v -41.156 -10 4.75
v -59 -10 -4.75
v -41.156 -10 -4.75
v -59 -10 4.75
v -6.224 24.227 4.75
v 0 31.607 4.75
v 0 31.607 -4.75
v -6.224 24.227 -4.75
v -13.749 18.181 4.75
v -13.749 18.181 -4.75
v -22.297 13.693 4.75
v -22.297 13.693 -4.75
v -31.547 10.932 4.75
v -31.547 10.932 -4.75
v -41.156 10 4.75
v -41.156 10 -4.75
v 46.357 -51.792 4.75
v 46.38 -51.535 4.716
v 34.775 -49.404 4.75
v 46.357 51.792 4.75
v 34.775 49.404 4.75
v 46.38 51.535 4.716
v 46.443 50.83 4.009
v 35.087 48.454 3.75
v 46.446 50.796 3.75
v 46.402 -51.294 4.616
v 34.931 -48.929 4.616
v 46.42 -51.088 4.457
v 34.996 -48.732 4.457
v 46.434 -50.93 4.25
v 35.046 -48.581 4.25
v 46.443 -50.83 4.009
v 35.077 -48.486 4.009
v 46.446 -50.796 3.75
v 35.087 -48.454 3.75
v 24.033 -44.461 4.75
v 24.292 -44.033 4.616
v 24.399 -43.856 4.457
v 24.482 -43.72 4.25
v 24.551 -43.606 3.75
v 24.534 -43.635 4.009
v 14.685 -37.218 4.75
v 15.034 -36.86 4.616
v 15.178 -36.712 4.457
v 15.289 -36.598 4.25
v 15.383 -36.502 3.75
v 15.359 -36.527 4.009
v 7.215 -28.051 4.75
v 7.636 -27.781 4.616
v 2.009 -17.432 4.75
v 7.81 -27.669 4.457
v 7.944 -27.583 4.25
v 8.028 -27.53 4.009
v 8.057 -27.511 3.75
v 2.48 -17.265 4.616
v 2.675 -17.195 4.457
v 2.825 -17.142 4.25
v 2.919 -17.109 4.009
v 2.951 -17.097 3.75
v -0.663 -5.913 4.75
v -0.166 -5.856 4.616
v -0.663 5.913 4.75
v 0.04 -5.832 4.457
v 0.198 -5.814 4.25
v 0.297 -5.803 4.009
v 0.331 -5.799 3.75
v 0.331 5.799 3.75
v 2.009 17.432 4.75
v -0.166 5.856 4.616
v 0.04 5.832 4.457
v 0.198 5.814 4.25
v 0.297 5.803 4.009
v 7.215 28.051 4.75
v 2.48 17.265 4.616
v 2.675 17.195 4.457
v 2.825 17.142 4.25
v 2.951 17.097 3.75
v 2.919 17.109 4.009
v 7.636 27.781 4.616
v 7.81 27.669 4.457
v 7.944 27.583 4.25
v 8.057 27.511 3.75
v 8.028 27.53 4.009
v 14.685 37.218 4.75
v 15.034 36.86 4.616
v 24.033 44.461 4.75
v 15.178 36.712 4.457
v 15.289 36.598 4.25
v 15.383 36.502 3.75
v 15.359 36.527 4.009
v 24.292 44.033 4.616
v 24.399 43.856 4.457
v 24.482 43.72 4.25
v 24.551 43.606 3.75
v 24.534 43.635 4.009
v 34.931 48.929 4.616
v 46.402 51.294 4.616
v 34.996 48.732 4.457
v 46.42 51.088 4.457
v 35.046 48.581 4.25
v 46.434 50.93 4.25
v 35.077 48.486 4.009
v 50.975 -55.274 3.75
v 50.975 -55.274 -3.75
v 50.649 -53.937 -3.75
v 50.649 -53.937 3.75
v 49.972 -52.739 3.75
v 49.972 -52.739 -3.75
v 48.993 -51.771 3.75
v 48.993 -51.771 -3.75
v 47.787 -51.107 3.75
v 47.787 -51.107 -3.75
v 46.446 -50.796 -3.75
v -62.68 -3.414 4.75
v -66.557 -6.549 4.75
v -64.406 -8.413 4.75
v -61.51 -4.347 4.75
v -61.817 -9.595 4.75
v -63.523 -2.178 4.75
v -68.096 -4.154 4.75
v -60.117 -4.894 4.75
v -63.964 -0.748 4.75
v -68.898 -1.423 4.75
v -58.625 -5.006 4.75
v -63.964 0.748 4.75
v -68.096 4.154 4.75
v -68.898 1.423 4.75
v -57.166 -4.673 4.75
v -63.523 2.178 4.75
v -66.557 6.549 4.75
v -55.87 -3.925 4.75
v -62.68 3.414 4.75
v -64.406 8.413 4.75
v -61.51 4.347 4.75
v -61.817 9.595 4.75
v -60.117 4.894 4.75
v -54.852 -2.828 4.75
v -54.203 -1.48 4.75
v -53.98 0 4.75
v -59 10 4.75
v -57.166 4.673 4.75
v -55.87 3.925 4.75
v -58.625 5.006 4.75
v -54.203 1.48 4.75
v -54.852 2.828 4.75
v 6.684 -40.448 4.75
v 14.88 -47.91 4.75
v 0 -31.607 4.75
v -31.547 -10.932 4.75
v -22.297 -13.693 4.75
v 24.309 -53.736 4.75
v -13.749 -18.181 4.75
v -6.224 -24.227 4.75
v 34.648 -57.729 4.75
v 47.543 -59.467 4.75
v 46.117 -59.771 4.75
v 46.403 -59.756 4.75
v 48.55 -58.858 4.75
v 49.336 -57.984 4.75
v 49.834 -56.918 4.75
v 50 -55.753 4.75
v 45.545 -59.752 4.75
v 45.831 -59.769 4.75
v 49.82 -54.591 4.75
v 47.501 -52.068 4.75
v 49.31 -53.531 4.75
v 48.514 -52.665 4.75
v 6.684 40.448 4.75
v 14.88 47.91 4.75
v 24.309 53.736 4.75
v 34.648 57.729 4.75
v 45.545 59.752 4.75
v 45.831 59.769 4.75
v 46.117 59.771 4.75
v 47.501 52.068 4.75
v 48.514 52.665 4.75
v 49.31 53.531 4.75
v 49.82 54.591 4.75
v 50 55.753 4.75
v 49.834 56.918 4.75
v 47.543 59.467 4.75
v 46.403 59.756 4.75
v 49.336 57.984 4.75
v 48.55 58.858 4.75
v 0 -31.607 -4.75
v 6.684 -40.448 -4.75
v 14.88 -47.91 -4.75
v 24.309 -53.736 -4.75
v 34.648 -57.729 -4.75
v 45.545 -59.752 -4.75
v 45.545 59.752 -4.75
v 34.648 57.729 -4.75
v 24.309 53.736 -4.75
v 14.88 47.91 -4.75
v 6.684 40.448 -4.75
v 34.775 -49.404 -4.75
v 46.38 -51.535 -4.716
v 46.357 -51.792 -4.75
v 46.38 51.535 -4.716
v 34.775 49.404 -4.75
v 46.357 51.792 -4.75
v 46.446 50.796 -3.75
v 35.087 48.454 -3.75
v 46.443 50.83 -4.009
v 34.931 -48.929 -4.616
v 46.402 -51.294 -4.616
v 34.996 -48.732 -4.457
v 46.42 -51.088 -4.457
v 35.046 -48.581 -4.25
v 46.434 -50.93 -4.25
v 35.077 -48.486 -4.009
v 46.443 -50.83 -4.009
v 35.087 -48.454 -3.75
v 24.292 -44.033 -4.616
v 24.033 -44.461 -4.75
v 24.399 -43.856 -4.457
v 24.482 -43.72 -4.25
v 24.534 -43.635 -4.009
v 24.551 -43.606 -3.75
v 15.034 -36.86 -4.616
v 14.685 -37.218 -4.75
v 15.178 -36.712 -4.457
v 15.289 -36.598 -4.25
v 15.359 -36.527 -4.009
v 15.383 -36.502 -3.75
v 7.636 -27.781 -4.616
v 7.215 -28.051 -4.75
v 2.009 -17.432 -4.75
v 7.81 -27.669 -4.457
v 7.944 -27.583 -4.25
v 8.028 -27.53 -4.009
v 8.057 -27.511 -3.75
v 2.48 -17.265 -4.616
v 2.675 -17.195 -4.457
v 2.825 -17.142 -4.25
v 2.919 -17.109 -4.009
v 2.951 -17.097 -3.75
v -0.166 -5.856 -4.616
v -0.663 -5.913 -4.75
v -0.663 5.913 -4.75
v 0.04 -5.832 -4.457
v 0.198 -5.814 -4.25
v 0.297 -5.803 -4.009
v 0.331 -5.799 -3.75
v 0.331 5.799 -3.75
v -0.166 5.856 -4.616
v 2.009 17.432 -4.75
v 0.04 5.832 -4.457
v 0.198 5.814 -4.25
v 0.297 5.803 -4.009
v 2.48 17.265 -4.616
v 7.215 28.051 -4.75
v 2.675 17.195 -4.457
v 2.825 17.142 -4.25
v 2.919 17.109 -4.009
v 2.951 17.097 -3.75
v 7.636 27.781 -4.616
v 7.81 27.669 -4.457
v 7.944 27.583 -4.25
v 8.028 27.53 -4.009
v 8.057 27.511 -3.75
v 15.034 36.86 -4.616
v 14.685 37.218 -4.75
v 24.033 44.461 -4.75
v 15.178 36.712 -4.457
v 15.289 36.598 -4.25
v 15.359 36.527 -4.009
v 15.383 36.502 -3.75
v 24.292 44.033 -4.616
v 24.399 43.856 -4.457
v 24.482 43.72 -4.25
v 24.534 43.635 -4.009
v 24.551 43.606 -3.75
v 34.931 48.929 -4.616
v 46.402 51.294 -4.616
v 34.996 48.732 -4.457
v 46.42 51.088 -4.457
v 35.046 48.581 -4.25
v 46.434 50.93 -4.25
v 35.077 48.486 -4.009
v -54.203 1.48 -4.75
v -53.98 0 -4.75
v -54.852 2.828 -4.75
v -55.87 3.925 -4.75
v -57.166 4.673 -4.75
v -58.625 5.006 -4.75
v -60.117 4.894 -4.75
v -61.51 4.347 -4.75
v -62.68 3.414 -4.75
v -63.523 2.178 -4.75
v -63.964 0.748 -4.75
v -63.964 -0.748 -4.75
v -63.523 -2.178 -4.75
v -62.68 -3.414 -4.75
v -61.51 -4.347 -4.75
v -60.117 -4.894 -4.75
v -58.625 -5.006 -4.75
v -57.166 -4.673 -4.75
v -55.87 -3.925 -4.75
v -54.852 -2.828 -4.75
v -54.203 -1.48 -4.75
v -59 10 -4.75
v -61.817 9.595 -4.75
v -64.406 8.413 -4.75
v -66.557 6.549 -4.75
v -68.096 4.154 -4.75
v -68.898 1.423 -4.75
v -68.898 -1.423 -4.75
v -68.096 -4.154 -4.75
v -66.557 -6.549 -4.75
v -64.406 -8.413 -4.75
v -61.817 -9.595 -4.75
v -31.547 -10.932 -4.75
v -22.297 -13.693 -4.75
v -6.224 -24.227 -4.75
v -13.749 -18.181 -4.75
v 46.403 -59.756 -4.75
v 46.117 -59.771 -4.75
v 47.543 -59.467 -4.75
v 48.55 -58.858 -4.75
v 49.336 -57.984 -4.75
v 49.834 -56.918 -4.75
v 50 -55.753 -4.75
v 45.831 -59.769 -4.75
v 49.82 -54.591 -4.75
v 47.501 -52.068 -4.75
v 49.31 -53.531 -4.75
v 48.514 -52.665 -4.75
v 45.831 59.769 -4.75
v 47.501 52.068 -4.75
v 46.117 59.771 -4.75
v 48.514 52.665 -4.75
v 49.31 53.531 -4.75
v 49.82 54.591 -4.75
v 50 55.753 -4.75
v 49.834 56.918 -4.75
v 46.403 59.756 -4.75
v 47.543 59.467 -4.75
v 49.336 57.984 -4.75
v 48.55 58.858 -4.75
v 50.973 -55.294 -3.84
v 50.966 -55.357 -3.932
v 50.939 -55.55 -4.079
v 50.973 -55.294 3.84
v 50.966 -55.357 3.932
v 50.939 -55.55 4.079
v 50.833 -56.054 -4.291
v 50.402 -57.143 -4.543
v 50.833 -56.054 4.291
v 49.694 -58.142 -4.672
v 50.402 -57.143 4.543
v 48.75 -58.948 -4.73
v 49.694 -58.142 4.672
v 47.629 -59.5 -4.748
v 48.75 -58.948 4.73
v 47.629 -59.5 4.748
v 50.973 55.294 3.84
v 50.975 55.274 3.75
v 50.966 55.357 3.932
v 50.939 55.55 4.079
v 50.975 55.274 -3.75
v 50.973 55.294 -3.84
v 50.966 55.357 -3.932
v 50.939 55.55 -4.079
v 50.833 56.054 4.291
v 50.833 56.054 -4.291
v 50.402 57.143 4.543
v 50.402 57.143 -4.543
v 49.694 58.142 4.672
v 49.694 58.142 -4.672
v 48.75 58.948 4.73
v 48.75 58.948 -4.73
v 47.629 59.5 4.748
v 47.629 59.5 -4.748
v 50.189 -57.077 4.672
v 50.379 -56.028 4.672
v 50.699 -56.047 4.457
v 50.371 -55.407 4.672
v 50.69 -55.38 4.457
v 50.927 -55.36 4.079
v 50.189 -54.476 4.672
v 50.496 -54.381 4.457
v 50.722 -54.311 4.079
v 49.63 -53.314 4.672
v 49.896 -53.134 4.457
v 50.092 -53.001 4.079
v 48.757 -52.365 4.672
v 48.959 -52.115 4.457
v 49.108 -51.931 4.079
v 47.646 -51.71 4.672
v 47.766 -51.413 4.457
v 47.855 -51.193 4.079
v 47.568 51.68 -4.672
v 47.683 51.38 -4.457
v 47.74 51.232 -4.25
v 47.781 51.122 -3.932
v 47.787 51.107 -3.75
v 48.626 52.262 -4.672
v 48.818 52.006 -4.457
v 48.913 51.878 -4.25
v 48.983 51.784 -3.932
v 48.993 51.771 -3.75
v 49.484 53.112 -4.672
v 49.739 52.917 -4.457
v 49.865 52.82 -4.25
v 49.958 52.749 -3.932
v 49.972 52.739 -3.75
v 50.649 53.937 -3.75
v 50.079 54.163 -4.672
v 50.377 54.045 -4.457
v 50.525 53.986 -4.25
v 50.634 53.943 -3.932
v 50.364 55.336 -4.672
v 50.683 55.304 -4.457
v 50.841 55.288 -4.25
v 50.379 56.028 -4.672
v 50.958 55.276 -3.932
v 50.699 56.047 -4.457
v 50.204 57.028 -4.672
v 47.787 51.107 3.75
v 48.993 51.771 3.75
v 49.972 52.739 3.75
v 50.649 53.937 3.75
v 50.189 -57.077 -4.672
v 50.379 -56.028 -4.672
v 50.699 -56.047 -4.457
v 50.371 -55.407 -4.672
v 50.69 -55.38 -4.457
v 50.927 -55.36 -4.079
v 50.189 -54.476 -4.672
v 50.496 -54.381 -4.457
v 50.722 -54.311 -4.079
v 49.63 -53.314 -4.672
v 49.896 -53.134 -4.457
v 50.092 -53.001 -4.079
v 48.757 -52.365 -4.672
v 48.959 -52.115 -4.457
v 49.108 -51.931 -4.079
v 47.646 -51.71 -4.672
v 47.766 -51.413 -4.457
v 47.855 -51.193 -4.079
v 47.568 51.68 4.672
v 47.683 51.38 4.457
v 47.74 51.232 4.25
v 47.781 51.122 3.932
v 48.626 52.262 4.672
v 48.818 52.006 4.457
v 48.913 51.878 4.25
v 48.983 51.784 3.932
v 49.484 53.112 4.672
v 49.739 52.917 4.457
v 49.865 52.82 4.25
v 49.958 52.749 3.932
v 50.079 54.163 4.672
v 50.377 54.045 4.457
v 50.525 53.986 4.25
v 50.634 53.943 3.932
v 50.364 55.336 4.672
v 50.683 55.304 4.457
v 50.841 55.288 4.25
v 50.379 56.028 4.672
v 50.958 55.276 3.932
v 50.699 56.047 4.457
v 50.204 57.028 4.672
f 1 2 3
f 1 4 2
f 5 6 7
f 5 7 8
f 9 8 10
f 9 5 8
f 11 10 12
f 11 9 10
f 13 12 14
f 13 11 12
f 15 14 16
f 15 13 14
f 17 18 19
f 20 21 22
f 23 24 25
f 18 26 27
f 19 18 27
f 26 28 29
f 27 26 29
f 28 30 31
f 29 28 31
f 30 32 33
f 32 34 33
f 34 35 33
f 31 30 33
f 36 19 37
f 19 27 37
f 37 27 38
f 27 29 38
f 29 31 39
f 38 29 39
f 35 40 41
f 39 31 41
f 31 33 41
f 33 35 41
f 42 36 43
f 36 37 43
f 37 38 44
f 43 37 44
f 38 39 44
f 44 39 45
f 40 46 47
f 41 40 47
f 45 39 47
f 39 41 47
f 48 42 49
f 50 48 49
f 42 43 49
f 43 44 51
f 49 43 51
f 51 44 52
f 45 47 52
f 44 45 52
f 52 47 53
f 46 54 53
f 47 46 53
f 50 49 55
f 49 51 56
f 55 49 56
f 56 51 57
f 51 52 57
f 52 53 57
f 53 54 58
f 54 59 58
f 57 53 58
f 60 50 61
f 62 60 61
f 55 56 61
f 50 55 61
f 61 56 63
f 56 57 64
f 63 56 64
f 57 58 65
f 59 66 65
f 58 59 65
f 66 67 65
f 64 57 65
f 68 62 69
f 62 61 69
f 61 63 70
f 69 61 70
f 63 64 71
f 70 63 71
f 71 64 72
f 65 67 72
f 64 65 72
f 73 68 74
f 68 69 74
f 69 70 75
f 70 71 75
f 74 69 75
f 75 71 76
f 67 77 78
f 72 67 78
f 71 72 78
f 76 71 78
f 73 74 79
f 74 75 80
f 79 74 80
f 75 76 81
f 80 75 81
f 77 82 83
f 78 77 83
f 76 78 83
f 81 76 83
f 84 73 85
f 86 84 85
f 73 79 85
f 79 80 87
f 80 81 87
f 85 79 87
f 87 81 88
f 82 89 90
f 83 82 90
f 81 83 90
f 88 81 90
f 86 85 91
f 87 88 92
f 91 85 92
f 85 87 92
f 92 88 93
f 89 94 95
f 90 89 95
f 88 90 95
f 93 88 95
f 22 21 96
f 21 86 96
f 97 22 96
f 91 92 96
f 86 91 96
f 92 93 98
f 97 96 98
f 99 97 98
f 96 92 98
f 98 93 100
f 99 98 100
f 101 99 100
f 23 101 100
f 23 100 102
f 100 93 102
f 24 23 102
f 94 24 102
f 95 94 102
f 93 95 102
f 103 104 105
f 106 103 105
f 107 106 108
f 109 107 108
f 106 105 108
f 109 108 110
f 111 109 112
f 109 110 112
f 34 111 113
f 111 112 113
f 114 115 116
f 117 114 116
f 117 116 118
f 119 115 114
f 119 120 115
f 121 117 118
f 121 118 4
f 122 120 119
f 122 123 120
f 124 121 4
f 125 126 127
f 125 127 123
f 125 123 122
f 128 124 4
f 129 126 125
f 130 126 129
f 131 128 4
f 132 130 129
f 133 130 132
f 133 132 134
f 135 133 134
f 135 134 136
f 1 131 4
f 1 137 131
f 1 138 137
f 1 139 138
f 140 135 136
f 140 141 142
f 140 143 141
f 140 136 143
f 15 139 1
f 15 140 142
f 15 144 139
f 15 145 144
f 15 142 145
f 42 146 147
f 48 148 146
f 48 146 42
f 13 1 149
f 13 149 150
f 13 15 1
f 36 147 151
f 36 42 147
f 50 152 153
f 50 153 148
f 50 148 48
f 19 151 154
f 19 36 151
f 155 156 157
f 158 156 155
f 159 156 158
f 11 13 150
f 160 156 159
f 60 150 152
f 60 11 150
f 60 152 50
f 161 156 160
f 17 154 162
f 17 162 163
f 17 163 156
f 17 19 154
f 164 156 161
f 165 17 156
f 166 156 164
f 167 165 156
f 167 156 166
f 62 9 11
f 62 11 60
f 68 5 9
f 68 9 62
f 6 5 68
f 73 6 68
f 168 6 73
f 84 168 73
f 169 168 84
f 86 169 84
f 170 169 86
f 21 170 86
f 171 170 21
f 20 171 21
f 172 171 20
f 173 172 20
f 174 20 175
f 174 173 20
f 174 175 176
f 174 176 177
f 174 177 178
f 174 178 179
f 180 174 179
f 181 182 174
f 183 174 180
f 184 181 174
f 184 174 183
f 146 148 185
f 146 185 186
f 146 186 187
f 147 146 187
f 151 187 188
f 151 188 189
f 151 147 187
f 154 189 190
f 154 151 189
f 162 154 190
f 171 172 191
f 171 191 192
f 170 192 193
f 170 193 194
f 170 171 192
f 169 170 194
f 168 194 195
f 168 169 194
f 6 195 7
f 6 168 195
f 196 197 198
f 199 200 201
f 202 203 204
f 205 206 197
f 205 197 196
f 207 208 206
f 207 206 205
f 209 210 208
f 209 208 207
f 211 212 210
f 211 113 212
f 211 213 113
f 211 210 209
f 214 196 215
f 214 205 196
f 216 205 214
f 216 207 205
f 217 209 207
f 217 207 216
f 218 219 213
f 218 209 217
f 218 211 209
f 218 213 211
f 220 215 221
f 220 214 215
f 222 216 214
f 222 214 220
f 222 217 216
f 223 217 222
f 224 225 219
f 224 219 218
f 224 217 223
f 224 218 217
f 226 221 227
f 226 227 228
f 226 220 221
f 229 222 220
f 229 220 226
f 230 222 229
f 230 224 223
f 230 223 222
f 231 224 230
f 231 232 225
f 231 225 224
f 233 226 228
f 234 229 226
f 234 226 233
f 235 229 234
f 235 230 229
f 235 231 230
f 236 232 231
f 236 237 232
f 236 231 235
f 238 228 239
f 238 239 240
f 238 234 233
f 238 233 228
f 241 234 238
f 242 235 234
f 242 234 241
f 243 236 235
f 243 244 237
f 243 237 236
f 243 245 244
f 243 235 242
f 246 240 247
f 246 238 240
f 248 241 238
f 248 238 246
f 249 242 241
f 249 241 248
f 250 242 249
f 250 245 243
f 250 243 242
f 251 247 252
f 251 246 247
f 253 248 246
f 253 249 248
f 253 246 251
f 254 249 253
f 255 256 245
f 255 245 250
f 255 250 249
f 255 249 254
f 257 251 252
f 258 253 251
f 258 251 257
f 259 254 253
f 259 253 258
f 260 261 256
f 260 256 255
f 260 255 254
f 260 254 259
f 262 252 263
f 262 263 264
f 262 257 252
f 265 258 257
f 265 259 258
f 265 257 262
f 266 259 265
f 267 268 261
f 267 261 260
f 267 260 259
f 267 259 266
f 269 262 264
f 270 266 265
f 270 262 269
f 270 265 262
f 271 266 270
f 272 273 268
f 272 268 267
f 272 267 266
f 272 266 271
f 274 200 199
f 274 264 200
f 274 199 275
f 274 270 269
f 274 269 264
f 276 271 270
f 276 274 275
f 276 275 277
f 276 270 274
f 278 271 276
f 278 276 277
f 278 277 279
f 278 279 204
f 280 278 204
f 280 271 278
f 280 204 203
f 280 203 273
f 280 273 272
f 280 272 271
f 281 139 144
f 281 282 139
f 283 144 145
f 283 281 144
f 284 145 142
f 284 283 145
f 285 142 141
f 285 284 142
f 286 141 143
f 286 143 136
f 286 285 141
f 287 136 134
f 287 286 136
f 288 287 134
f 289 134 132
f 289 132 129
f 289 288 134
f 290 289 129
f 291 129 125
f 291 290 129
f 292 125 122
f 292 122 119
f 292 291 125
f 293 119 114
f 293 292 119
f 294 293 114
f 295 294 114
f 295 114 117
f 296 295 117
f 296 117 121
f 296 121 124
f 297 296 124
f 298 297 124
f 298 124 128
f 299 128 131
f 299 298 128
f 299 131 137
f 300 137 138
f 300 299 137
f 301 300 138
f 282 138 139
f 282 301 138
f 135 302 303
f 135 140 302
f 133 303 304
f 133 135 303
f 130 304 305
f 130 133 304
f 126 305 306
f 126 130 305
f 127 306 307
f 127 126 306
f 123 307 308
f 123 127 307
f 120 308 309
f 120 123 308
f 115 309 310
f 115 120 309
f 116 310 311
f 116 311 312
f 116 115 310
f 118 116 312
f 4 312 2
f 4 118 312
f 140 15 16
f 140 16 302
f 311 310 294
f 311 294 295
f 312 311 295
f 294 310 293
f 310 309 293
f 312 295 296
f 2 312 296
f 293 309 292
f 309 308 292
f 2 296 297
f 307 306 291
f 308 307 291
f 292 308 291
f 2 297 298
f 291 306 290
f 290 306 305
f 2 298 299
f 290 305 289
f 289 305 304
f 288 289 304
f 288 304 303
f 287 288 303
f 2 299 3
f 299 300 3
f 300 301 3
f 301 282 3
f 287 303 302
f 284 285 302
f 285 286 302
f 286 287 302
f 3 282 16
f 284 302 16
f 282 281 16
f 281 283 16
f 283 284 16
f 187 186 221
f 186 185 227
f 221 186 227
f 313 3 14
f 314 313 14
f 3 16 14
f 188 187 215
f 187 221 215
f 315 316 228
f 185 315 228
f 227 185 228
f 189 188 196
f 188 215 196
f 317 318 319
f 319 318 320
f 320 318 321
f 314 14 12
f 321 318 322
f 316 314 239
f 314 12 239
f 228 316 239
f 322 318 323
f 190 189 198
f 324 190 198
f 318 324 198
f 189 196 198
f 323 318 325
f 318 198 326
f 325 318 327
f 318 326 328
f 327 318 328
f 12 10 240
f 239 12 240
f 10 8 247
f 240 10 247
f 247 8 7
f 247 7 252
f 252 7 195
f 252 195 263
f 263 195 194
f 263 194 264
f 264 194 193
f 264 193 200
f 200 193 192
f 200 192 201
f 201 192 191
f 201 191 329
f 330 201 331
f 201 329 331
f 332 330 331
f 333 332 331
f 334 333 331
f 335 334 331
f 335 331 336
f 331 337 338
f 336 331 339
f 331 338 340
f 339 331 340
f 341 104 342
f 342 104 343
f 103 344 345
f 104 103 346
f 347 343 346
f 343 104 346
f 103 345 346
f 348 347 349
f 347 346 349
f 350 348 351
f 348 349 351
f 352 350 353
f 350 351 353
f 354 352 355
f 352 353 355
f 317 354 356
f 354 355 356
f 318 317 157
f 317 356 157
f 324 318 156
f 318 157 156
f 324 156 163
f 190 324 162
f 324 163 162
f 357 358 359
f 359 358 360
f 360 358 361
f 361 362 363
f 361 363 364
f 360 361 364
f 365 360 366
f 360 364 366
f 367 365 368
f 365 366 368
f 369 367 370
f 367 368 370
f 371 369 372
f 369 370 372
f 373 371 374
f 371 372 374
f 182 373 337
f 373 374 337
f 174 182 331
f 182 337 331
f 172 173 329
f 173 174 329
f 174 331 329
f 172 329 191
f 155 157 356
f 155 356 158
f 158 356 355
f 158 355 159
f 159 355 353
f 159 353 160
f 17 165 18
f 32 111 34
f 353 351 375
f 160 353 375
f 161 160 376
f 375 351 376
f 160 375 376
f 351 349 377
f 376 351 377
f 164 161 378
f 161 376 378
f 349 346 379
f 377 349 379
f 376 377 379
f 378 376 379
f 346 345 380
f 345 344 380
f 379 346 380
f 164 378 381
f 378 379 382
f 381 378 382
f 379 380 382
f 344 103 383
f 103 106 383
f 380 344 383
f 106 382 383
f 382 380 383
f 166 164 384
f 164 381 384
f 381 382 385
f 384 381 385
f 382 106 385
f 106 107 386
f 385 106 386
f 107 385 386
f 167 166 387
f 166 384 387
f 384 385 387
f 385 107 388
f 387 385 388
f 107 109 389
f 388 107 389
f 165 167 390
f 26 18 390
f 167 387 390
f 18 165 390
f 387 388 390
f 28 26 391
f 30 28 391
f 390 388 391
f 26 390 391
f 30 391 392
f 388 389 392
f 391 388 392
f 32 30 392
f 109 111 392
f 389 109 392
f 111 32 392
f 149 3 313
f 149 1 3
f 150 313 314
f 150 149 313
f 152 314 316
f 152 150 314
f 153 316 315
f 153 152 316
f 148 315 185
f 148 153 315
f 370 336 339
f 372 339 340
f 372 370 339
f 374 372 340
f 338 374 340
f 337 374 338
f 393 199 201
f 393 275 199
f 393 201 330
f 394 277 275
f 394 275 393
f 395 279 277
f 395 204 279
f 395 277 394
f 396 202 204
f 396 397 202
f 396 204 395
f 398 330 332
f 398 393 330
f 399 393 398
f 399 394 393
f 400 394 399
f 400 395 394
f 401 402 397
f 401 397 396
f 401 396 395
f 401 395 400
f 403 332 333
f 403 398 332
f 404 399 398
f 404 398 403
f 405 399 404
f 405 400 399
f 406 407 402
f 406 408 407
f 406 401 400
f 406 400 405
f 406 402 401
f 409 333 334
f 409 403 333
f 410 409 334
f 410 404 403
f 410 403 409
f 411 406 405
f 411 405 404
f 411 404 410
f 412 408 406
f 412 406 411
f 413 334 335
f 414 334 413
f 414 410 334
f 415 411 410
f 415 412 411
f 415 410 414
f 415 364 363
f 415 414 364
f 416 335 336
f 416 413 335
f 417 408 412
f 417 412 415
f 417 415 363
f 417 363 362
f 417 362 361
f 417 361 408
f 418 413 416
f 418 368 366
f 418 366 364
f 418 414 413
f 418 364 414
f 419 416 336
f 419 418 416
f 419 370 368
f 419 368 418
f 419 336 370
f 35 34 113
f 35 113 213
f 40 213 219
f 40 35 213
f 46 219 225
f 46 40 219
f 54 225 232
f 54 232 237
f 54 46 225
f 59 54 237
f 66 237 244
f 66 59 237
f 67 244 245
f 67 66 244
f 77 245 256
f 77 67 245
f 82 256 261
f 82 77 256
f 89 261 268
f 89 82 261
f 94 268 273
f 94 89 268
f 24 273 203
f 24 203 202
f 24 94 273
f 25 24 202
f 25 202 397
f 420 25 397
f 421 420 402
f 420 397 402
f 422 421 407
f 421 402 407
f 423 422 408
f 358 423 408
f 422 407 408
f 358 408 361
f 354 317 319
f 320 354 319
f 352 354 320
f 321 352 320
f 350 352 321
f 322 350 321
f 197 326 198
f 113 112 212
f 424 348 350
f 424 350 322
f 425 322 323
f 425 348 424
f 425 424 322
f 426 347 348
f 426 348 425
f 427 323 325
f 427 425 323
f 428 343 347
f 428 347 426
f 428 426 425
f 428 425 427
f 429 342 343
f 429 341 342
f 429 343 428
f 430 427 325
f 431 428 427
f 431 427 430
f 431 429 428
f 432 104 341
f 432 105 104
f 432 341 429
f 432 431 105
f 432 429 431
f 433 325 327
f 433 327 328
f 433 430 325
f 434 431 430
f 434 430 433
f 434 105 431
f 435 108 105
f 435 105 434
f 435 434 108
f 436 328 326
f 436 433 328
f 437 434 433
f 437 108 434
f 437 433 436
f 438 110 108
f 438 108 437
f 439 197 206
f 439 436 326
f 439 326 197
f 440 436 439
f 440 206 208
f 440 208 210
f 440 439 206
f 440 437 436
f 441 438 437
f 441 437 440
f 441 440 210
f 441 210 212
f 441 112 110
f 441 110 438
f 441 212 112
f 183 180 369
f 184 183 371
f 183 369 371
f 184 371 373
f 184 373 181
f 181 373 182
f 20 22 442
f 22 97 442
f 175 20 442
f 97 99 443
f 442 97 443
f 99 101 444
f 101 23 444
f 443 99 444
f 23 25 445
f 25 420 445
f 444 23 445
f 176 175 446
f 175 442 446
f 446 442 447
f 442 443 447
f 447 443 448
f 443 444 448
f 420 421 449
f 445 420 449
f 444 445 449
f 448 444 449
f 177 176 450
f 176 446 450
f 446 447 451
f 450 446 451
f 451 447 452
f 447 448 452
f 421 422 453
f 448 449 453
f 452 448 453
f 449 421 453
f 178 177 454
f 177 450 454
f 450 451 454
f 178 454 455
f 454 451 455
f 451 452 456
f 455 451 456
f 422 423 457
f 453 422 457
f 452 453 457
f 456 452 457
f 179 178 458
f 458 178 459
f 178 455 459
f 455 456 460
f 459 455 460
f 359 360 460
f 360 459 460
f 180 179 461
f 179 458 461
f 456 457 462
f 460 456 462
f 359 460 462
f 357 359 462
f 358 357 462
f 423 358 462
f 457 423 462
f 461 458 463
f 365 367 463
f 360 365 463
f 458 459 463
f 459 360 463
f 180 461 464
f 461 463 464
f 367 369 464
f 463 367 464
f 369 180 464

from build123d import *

# Parameters (mm, degrees)
SKETCH1_R           = 5.02
BOSS_EXTRUDE1_DEPTH = 4.75
FILLET2_R           = 5
FILLET3_R           = 1


with BuildPart() as part:
    # Sketch1 → Boss-Extrude1 (new, symmetric)
    with BuildSketch(Plane.XY):
        with BuildLine():
            Line((51, -60), (51, -51))
            ThreePointArc((51, -51), (0, 0), (51, 51))
            Line((51, 51), (51, 60))
            ThreePointArc((51, 60), (21.814538512, 52.423361565), (0, 31.606961259))
            ThreePointArc((0, 31.606961259), (-17.914586674, 15.730078286), (-41.156231011, 10))
            Line((-41.156231011, 10), (-59, 10))
            ThreePointArc((-59, 10), (-69, 0), (-59, -10))
            Line((-59, -10), (-41.156231011, -10))
            ThreePointArc((-41.156231011, -10), (-17.914586674, -15.730078286), (0, -31.606961259))
            ThreePointArc((0, -31.606961259), (21.814538512, -52.423361565), (51, -60))
        make_face()
        with Locations((-59, 0)):
            Circle(SKETCH1_R, mode=Mode.SUBTRACT)
    extrude(amount=BOSS_EXTRUDE1_DEPTH, both=True)

    # Fillet2
    # the kernel refuses this fillet: 5 mm, written as the material it takes off along each edge
    with BuildSketch(Plane(origin=(51, -60, 18.400501973), x_dir=(0, 1, 0), z_dir=(0, 0, -1))) as fillet2_piece_1:
        with BuildLine():
            CenterArc((5.227744249, -5), FILLET2_R, 90, 95.21590857)
            ThreePointArc((0.248448272, -5.454545455), (0.062144251, -2.730100395), (0, 0))
            Line((0, 0), (5.227744249, 0))
        make_face()
    extrude(amount=36.801003947, mode=Mode.SUBTRACT)
    with BuildSketch(Plane(origin=(51, -51, -16.690847674), x_dir=(0, -1, 0), z_dir=(0, 0, 1))) as fillet2_piece_2:
        with BuildLine():
            CenterArc((4.77633907, -5), FILLET2_R, 90, 84.8774839)
            ThreePointArc((-0.203691205, -4.553571429), (-0.050948249, -2.279062464), (0, 0))
            Line((0, 0), (4.77633907, 0))
        make_face()
    extrude(amount=33.381695348, mode=Mode.SUBTRACT)
    with BuildSketch(Plane(origin=(51, 60, -18.400501973), x_dir=(-0.9989642624898897, -0.04550167324429649, 0), z_dir=(0, 0, 1))) as fillet2_piece_3:
        with BuildLine():
            CenterArc((5.232692423, 4.994821312), FILLET2_R, 177.392045715, 95.21590857)
            Line((0.237871111, 5.222329679), (0, 0))
            ThreePointArc((0, 0), (2.730100395, -0.062144251), (5.460200789, 0))
        make_face()
    extrude(amount=36.801003947, mode=Mode.SUBTRACT)
    with BuildSketch(Plane(origin=(51, 51, -16.690847674), x_dir=(0, 1, 0), z_dir=(0, 0, 1))) as fillet2_piece_4:
        with BuildLine():
            CenterArc((4.77633907, 5), FILLET2_R, 185.1225161, 84.8774839)
            ThreePointArc((-0.203691205, 4.553571429), (-0.050948249, 2.279062464), (0, 0))
            Line((0, 0), (4.77633907, 0))
        make_face()
    extrude(amount=33.381695348, mode=Mode.SUBTRACT)

    # Fillet3
    fillet3_edges = [part.edges().sort_by_distance(p)[0] for p in [
        (0, 0, -4.75),
        (49.515727495, 52.221109094, -4.75),
        (49.515727495, -52.221109094, -4.75),
        (0, 0, 4.75),
        (49.515727495, 52.221109094, 4.75),
        (49.515727495, -52.221109094, 4.75),
    ]]
    fillet(fillet3_edges, radius=FILLET3_R)


solid = part.part
